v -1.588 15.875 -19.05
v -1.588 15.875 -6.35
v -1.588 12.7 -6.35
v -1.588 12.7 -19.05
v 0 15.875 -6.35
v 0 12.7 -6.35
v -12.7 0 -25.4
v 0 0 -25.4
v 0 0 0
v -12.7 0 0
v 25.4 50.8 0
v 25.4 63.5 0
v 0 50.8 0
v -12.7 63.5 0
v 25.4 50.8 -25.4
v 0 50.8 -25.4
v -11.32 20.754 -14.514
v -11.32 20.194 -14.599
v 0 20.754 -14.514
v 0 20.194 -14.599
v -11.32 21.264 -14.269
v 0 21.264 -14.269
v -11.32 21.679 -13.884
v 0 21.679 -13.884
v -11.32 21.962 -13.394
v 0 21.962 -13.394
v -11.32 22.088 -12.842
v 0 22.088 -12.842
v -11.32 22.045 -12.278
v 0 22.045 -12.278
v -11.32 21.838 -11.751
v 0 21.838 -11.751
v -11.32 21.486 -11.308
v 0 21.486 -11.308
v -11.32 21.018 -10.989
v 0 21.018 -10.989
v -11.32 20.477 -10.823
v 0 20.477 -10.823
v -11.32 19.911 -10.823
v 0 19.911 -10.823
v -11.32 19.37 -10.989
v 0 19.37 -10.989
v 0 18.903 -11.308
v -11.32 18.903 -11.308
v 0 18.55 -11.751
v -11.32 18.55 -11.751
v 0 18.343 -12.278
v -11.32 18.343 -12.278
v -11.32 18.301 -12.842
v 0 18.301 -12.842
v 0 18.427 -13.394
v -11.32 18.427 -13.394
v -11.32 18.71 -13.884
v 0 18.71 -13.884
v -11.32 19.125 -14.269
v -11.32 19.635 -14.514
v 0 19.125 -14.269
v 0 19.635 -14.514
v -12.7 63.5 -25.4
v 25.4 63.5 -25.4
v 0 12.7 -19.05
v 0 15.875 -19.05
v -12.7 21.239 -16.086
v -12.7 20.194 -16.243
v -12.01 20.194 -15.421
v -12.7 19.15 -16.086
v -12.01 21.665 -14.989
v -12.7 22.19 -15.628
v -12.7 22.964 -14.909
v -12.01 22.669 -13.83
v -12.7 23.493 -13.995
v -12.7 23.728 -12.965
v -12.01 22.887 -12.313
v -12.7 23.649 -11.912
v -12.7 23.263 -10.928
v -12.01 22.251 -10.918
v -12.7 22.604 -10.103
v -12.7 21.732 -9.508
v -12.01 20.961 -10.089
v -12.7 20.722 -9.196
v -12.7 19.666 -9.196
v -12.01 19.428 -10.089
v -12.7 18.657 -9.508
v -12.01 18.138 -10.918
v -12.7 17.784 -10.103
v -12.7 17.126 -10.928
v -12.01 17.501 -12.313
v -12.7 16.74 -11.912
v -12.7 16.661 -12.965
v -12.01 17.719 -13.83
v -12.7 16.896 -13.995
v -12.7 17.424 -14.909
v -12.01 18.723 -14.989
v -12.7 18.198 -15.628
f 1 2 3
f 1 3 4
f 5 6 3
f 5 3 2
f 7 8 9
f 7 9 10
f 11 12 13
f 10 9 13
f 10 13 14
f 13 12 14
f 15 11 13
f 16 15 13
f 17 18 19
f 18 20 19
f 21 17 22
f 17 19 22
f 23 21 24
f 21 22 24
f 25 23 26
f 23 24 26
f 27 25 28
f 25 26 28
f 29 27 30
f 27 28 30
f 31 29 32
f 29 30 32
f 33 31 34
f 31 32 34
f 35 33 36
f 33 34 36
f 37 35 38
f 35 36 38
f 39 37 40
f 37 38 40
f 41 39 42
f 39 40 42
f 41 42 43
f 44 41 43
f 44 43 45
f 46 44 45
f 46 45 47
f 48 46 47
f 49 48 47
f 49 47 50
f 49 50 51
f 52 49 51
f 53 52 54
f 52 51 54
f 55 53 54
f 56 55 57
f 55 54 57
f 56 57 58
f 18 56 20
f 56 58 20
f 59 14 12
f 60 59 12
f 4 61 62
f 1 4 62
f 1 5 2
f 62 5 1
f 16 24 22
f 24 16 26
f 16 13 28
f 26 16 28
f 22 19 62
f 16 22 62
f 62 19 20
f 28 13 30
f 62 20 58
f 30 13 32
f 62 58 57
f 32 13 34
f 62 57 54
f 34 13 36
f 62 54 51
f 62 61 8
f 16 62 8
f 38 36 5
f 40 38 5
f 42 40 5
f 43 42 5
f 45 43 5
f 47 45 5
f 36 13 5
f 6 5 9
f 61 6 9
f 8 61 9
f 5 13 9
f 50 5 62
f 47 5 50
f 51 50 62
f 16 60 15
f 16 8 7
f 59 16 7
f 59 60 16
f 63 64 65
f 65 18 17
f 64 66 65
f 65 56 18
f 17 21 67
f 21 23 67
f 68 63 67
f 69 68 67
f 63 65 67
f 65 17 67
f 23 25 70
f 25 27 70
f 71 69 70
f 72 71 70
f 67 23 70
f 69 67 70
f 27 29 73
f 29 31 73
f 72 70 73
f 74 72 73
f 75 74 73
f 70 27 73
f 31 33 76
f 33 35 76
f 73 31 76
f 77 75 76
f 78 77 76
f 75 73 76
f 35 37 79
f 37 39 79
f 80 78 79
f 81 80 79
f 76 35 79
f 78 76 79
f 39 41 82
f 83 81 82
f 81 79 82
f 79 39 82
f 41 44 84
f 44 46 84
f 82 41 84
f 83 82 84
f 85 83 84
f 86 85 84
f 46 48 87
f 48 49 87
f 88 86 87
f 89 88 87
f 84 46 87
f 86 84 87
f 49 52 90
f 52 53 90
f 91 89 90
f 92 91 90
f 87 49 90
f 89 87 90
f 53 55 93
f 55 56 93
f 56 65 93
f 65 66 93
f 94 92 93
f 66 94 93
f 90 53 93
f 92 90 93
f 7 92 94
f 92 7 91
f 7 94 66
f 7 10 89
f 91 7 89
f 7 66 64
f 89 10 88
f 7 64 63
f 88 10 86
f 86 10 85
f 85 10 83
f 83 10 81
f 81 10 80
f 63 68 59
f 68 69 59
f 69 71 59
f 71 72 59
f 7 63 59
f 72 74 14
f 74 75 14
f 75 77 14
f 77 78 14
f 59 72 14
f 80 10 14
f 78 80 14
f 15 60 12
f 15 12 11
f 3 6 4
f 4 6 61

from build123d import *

# Parameters (mm, degrees)
BOSS_EXTRUDE1_DEPTH                               = 25.4
SKETCH2_W                                         = 12.7
SKETCH2_H                                         = 3.175
CUT_EXTRUDE1_DEPTH                                = 1.5875
CSK_FOR_6_FLAT_HEAD_MACHINE_SCREW_100_D           = 3.7973
CSK_FOR_6_FLAT_HEAD_MACHINE_SCREW_100_DEPTH       = 25.4
CSK_FOR_6_FLAT_HEAD_MACHINE_SCREW_100_CSINK_D     = 7.0866
CSK_FOR_6_FLAT_HEAD_MACHINE_SCREW_100_CSINK_ANGLE = 100
CSK_FOR_6_FLAT_HEAD_MACHINE_SCREW_100_TIP         = 1.140824014


with BuildPart() as part:
    # Sketch1 → Boss-Extrude1 (new body)
    with BuildSketch(Plane.XY):
        Polygon((-12.7, 0), (-12.7, 63.5), (25.4, 63.5), (25.4, 50.8), (0, 50.8), (0, 0), align=None)
    extrude(amount=-BOSS_EXTRUDE1_DEPTH)

    # Sketch2 → Cut-Extrude1 (cut)
    with BuildSketch(Plane(origin=(0, 0, 0), x_dir=(0, 0, -1), z_dir=(1, 0, 0))):
        with Locations((12.7, 14.2875)):
            Rectangle(SKETCH2_W, SKETCH2_H)
    extrude(amount=-CUT_EXTRUDE1_DEPTH, mode=Mode.SUBTRACT)

    # CSK for #6 Flat Head Machine Screw (100)1
    with Locations(Plane(origin=(-12.7, -5.150678534, -61.119160157), x_dir=(0, 0, 1), z_dir=(-1, 0, 0))):
        with Locations((48.419160157, 25.344845691)):
            CounterSinkHole(CSK_FOR_6_FLAT_HEAD_MACHINE_SCREW_100_D / 2, CSK_FOR_6_FLAT_HEAD_MACHINE_SCREW_100_CSINK_D / 2, depth=CSK_FOR_6_FLAT_HEAD_MACHINE_SCREW_100_DEPTH, counter_sink_angle=CSK_FOR_6_FLAT_HEAD_MACHINE_SCREW_100_CSINK_ANGLE)
            with Locations((0, 0, -(CSK_FOR_6_FLAT_HEAD_MACHINE_SCREW_100_DEPTH + CSK_FOR_6_FLAT_HEAD_MACHINE_SCREW_100_TIP / 2))):  # 118° drill point
                Cone(0, CSK_FOR_6_FLAT_HEAD_MACHINE_SCREW_100_D / 2, CSK_FOR_6_FLAT_HEAD_MACHINE_SCREW_100_TIP, mode=Mode.SUBTRACT)


solid = part.part
